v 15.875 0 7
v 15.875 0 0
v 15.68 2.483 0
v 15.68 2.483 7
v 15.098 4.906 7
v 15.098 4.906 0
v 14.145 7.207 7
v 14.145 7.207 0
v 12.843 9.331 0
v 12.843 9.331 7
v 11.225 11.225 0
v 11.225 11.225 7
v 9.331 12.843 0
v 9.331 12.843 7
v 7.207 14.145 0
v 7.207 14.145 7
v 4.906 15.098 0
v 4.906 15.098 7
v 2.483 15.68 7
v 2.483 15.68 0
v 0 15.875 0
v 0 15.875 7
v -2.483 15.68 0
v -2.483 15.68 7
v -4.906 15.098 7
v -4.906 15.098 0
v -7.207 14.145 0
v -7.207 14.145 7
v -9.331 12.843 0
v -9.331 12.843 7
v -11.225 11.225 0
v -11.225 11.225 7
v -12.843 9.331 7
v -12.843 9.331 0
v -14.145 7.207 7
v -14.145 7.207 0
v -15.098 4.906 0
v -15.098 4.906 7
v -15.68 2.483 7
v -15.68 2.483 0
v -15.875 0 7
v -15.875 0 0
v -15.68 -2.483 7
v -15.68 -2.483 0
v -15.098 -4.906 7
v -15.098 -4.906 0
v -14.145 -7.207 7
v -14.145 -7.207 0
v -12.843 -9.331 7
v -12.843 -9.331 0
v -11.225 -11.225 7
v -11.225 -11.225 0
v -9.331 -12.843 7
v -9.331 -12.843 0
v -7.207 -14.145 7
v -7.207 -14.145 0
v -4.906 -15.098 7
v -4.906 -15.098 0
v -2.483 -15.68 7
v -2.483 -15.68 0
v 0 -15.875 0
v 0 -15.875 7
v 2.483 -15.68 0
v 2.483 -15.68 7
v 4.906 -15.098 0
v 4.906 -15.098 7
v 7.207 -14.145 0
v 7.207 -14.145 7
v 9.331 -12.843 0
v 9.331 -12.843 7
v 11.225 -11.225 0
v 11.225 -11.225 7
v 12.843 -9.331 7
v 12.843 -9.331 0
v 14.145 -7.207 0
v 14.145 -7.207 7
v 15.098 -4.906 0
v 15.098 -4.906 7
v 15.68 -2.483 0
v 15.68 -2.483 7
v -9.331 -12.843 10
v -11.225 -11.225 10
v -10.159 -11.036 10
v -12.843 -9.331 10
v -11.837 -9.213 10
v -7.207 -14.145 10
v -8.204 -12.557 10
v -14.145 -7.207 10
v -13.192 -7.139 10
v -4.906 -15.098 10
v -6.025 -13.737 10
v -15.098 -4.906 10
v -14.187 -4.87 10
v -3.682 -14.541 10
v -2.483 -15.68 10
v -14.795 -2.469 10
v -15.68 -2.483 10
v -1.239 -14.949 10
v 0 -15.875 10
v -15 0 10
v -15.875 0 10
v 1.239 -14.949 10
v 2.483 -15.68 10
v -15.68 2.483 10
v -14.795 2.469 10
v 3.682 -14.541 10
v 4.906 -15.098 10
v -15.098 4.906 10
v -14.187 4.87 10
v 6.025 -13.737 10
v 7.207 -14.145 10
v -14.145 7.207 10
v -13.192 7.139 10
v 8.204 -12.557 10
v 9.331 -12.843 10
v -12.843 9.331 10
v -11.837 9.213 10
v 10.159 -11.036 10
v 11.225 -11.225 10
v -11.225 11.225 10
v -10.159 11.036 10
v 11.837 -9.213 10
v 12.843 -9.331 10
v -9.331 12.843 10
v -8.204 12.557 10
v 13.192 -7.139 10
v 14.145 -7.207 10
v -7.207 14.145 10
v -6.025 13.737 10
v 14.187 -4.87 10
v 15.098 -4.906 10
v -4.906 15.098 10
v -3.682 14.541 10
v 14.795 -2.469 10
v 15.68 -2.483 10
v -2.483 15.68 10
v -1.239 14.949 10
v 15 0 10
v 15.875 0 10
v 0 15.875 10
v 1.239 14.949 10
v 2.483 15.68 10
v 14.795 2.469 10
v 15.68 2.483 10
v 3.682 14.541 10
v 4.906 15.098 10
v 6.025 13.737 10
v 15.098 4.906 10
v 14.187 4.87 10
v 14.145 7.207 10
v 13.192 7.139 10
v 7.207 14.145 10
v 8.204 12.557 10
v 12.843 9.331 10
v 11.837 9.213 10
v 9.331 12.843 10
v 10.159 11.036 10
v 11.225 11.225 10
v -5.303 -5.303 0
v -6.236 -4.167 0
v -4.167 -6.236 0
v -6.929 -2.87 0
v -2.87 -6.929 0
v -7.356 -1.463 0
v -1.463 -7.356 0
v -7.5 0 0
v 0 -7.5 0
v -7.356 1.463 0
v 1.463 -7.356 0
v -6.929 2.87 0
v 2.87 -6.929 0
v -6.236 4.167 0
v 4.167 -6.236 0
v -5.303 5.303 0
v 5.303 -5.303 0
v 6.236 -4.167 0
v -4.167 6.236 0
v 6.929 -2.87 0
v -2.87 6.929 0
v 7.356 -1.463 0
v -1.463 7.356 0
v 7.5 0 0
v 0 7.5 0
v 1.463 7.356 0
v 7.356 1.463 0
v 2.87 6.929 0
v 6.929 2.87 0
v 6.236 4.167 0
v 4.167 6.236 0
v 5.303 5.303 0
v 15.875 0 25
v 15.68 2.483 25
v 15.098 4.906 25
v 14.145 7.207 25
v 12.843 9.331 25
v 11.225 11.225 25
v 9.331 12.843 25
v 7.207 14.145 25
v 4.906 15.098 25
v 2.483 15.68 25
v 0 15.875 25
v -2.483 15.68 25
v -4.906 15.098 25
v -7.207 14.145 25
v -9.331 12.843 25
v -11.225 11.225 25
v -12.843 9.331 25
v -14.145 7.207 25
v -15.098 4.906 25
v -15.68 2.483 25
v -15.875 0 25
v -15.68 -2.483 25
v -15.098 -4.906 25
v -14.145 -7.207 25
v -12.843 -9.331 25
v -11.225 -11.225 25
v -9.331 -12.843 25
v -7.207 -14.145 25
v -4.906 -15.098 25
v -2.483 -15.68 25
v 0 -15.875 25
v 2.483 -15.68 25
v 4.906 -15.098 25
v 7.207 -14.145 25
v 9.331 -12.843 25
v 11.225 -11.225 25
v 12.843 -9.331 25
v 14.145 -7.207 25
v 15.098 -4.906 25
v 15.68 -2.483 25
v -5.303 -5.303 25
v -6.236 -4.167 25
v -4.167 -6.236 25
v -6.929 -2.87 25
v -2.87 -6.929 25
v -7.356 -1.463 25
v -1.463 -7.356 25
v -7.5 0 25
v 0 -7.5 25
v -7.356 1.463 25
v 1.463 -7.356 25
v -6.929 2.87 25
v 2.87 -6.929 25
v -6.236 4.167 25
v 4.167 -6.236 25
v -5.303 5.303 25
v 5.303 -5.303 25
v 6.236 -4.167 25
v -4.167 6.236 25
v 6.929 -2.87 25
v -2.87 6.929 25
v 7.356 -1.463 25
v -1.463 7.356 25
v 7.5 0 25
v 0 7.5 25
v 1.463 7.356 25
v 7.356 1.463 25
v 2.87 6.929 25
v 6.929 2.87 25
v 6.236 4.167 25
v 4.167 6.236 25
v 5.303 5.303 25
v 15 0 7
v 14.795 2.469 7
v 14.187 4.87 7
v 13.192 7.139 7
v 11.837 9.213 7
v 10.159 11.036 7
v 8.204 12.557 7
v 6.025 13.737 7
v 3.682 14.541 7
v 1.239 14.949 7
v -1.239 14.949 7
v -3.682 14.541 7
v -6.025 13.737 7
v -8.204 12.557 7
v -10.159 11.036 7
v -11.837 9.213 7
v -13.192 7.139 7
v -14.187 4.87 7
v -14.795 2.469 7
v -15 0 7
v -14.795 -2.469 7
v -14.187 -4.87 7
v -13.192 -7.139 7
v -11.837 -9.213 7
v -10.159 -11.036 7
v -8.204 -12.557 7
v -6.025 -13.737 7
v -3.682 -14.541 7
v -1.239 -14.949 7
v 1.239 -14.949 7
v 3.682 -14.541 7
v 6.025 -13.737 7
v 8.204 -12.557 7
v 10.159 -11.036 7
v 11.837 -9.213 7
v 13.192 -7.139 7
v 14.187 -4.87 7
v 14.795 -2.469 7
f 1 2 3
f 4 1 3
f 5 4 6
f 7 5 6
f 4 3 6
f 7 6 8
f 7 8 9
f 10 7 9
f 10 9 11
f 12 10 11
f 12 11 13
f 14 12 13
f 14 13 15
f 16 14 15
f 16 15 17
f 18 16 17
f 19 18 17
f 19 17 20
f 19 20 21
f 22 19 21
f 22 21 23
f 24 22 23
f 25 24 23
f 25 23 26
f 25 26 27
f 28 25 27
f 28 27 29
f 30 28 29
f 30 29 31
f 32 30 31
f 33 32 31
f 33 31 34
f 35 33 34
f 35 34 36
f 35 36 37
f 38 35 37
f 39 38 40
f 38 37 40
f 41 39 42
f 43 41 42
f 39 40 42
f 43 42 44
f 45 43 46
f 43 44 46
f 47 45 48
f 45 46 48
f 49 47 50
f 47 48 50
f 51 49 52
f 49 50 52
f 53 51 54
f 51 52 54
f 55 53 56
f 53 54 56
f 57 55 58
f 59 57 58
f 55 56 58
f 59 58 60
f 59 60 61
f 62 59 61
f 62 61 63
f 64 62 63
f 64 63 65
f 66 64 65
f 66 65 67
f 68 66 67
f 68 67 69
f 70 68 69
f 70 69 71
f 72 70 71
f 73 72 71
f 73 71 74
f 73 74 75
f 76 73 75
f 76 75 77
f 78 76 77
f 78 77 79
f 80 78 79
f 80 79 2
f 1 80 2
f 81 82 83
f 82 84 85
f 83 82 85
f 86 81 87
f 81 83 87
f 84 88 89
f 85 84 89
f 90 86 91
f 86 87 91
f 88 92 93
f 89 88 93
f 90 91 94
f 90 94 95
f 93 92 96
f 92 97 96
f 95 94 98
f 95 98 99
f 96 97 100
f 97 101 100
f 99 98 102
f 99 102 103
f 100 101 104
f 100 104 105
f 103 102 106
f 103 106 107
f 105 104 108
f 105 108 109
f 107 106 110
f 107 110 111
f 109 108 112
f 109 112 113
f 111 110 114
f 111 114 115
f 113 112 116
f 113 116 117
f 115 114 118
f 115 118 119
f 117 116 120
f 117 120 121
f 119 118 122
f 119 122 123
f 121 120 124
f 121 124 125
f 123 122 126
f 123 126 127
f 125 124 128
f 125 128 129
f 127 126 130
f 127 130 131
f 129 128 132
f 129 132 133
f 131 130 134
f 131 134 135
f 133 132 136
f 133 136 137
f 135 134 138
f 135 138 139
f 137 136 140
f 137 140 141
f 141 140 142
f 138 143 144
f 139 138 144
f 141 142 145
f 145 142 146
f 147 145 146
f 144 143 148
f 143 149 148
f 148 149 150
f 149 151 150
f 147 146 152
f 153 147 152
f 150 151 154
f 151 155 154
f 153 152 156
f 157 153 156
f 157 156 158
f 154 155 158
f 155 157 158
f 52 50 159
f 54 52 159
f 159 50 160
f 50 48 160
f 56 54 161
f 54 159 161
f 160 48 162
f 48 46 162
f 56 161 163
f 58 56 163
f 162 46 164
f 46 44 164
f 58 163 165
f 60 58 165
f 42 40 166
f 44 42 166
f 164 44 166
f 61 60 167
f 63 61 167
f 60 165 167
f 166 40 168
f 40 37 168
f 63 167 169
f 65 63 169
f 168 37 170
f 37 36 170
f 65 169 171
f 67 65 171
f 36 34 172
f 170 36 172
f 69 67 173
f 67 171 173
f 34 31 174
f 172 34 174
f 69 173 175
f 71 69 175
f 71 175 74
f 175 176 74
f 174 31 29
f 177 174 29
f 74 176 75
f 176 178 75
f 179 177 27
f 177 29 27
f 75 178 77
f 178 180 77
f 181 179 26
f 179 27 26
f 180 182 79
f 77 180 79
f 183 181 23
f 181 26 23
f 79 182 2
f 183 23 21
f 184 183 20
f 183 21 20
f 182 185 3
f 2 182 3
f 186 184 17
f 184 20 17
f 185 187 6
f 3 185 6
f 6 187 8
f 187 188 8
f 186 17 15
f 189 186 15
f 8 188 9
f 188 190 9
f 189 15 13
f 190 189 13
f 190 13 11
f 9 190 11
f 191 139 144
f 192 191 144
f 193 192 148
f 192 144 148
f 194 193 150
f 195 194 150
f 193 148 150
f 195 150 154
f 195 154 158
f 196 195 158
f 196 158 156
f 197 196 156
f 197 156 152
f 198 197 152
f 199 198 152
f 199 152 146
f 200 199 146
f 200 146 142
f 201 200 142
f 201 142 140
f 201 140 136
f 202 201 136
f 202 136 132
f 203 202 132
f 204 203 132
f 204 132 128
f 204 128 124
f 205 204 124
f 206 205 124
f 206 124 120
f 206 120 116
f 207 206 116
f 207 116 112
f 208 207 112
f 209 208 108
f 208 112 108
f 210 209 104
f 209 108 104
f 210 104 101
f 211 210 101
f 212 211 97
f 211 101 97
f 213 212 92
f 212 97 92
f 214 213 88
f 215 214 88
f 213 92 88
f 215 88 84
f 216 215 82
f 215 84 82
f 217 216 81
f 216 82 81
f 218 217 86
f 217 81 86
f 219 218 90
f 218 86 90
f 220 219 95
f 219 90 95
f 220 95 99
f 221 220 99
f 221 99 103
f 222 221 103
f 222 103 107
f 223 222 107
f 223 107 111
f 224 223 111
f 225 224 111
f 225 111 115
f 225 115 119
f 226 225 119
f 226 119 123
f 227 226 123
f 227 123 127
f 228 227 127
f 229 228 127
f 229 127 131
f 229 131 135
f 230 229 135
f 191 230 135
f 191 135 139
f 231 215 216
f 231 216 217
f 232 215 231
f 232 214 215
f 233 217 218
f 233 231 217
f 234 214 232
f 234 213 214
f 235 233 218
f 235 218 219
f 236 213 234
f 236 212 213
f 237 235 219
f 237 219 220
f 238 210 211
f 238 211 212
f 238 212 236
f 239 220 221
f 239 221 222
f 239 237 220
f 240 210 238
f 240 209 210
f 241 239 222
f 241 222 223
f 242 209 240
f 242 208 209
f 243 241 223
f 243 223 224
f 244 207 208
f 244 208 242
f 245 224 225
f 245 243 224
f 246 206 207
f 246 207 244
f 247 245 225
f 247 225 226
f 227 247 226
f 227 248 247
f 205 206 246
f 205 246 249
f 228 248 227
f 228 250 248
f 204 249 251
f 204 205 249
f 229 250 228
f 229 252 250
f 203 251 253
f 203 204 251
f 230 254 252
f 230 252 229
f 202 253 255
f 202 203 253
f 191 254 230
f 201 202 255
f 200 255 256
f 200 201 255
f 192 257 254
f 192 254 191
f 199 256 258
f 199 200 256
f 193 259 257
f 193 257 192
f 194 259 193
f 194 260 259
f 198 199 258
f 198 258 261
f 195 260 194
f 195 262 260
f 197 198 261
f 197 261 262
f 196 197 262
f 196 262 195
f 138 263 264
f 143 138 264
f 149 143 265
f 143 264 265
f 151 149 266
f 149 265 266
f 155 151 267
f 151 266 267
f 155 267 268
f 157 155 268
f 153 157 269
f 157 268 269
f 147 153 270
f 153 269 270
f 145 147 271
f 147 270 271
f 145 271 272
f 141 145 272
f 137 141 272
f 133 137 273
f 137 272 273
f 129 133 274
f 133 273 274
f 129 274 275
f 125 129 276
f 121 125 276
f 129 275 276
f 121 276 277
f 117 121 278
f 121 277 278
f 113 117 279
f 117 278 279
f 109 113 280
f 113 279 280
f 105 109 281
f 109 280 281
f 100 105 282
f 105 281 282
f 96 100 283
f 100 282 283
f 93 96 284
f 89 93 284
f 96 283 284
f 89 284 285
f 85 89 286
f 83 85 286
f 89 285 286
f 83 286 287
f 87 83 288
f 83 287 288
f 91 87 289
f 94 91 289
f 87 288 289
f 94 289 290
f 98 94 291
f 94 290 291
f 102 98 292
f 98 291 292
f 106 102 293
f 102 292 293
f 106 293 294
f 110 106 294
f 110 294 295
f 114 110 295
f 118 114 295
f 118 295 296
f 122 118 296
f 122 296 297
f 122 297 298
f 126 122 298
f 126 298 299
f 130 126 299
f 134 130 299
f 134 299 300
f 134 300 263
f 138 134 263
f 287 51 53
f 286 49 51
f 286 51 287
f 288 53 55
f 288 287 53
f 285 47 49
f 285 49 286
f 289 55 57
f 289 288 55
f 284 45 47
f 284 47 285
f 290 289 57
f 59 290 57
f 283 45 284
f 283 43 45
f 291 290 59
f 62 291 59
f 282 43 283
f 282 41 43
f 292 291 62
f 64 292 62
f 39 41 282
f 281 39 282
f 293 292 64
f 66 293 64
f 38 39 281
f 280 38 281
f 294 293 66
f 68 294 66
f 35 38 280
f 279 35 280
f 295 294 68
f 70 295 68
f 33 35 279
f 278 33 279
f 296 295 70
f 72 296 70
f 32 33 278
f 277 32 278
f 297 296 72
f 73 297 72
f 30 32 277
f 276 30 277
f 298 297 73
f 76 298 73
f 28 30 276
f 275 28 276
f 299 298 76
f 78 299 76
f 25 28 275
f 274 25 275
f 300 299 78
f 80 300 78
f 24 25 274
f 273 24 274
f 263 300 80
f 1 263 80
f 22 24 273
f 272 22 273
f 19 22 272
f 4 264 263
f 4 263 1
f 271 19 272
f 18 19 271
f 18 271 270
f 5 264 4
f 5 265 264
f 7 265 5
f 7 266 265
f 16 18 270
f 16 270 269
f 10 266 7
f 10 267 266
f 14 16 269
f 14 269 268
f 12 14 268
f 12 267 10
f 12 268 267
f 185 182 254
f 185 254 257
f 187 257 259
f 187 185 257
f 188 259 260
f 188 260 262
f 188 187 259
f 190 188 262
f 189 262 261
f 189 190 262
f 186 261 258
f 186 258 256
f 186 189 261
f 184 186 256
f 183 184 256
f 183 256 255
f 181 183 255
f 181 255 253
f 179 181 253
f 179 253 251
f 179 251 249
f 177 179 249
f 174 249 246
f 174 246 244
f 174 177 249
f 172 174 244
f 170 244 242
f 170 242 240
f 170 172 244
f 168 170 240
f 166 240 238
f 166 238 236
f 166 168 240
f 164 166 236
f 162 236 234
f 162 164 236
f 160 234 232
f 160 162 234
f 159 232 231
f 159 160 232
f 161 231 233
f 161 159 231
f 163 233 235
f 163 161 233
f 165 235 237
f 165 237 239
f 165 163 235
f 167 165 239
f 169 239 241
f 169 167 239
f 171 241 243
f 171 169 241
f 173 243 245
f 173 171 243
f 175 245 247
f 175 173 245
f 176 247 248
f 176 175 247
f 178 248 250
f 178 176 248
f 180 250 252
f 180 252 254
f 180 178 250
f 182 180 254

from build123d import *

# Parameters (mm, degrees)
F0_R     = 15.875
F0_R_2   = 7.5
F1_DEPTH = 25
F3_R     = 15.875
F3_R_2   = 15
F4_DEPTH = 3


with BuildPart() as f1:
    # F0 (on Top) → F1 (new body)
    with BuildSketch(Plane.XY):
        Circle(F0_R)
        Circle(F0_R_2, mode=Mode.SUBTRACT)
    extrude(amount=F1_DEPTH)

    # F3 (on offset) → F4 (cut)
    with BuildSketch(Plane.XY.offset(7)):
        Circle(F3_R)
        Circle(F3_R_2, mode=Mode.SUBTRACT)
    extrude(amount=F4_DEPTH, mode=Mode.SUBTRACT)


solid = f1.part
